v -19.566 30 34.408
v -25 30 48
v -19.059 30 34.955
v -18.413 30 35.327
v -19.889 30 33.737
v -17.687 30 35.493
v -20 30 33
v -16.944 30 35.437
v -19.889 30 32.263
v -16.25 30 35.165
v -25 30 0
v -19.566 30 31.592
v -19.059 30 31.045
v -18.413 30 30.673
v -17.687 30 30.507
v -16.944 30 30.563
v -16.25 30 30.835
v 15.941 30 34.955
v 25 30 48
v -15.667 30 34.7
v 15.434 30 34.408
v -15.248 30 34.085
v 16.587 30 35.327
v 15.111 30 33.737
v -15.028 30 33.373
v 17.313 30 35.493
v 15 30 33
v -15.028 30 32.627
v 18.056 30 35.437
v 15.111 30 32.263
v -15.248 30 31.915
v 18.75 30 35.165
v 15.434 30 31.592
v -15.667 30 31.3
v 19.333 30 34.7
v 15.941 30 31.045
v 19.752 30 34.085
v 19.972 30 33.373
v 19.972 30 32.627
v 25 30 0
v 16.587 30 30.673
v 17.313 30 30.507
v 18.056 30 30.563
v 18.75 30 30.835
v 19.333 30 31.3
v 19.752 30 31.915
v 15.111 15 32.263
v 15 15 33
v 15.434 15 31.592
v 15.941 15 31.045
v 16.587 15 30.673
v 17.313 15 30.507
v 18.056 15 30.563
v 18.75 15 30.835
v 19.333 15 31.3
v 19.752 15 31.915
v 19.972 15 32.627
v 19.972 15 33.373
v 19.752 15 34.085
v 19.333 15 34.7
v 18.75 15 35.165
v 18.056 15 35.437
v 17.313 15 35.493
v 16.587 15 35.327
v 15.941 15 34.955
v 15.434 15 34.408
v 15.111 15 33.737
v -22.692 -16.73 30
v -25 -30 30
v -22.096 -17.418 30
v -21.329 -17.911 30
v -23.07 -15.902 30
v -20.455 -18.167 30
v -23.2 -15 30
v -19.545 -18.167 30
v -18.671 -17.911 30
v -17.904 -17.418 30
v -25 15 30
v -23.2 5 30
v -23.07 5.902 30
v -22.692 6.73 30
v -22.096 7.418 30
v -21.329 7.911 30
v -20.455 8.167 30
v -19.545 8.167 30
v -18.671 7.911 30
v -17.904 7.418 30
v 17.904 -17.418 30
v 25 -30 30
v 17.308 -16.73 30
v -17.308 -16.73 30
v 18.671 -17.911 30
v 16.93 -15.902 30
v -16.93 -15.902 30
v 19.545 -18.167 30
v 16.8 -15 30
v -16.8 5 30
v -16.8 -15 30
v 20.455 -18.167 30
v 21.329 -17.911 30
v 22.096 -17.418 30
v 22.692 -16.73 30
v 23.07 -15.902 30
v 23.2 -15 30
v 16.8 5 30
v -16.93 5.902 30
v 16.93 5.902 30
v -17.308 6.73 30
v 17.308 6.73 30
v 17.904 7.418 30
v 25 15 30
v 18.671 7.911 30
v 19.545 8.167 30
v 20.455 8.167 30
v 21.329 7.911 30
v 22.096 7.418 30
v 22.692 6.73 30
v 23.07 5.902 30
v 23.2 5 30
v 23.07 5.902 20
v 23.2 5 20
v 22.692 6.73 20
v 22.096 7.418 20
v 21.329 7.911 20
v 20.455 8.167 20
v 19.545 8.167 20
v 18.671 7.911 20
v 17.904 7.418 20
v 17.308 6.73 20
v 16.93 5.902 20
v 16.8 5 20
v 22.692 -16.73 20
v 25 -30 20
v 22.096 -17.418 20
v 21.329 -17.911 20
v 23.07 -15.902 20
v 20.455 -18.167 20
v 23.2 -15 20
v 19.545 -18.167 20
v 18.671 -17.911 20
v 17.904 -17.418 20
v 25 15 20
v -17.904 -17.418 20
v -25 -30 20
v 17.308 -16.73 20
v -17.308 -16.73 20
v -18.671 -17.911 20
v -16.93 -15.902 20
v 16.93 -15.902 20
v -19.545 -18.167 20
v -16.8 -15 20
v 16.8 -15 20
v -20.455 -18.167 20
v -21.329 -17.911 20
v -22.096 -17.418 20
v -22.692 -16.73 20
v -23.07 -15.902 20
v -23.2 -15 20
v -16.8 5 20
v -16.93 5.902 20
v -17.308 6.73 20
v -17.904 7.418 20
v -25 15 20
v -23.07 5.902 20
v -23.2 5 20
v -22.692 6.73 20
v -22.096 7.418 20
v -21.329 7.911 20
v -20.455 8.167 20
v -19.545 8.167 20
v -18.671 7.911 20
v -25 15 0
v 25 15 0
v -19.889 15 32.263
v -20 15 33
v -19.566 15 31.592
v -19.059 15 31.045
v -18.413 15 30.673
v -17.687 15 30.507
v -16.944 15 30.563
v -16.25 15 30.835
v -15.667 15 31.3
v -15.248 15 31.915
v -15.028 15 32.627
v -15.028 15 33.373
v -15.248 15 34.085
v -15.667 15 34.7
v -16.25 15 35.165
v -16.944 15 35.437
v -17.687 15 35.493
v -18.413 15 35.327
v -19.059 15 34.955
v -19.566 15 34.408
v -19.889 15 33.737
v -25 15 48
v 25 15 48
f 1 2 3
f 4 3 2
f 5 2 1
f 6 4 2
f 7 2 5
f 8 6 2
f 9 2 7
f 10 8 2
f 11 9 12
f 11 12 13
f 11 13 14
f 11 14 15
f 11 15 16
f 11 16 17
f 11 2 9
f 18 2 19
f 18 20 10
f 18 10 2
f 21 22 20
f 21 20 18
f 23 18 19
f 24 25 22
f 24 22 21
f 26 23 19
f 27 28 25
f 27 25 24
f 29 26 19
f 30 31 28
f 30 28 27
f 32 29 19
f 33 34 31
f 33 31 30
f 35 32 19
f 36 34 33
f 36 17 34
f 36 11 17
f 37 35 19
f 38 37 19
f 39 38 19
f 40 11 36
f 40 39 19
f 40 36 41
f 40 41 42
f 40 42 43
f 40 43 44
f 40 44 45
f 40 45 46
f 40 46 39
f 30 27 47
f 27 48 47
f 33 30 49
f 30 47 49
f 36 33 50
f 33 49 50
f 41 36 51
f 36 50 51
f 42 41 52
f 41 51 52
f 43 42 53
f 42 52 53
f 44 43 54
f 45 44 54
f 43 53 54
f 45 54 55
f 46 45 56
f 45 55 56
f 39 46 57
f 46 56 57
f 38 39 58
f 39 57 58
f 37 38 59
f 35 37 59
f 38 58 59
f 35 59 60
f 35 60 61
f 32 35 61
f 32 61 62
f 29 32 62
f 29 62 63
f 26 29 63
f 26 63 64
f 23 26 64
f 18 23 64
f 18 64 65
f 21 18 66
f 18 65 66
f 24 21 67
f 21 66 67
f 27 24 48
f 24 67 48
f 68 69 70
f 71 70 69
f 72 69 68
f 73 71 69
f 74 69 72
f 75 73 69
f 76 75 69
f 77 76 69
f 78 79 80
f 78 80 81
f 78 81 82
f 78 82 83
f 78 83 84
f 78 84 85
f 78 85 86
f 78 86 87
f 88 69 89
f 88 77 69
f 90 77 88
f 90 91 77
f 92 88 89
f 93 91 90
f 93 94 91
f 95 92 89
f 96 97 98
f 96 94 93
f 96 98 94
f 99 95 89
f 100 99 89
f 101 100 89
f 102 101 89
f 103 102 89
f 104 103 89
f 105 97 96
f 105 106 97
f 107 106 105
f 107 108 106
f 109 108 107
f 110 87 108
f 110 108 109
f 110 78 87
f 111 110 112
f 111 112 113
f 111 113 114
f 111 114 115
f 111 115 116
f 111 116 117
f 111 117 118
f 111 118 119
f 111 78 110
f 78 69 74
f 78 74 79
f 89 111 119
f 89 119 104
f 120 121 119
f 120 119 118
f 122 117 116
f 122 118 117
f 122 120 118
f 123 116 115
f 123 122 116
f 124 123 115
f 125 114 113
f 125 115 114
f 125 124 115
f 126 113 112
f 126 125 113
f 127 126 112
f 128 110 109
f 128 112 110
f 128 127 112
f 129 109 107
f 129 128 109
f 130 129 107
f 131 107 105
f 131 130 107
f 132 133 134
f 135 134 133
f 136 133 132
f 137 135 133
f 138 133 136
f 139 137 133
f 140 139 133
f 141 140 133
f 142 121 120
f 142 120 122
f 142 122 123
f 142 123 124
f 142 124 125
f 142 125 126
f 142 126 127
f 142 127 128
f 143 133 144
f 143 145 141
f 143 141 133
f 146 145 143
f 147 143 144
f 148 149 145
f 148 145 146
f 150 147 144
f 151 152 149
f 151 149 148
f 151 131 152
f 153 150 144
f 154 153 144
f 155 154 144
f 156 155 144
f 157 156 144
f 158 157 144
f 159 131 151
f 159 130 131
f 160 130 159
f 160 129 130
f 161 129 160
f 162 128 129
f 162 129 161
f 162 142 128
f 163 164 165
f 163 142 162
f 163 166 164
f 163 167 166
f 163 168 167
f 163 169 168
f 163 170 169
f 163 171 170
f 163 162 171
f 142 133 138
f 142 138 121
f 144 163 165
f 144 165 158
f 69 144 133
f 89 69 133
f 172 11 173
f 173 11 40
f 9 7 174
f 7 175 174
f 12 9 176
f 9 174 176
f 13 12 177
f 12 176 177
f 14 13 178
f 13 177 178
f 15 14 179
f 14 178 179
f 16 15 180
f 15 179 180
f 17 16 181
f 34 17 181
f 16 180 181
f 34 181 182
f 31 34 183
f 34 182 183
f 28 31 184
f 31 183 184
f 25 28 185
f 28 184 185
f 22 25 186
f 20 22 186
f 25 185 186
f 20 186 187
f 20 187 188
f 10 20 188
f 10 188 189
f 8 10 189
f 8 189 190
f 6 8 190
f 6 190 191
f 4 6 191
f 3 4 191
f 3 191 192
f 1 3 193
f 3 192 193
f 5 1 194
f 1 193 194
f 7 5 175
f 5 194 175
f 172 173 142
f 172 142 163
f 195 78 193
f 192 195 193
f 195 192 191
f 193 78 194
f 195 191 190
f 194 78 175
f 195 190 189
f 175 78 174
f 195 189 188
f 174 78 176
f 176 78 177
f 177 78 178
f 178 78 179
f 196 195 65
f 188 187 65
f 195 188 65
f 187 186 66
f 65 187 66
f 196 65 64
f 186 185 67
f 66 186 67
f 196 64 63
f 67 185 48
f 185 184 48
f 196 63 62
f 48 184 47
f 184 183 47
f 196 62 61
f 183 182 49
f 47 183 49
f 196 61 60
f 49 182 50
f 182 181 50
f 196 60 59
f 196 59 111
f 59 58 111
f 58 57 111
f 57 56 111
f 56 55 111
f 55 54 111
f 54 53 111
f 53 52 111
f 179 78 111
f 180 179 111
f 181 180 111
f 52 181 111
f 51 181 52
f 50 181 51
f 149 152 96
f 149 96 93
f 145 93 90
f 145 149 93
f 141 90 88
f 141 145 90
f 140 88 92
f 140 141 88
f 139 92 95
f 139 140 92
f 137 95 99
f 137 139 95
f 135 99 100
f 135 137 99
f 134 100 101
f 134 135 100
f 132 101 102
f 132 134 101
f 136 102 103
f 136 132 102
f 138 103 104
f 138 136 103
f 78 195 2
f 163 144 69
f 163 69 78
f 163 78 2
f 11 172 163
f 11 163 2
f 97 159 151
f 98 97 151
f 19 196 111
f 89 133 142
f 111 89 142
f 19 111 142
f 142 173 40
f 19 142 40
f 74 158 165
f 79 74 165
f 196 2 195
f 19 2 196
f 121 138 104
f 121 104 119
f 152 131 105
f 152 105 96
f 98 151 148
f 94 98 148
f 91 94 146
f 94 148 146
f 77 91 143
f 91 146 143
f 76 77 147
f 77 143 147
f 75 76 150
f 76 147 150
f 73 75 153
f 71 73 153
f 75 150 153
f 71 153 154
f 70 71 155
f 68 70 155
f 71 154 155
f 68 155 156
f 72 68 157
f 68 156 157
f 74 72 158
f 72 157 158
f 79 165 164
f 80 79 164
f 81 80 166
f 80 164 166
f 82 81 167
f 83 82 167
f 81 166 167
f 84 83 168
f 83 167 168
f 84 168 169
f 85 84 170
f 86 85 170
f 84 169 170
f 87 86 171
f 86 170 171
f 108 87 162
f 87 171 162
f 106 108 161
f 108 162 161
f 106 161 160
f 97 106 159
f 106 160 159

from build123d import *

# Parameters (mm, degrees)
SKETCH_1_W             = 50
SKETCH_1_H             = 60
EXTRUDE_1_DEPTH        = 30
SKETCH_2_W             = 50
SKETCH_2_H             = 45
CUT_EXTRUDE_1_DEPTH    = 20
CUT_EXTRUDE_2_DEPTH    = 11
SKETCH_6_W             = 50
SKETCH_6_H             = 15
EXTRUDE_2_DEPTH        = 18
HOLE_WIZARD_M6_1_D     = 5
HOLE_WIZARD_M6_1_DEPTH = 15
HOLE_WIZARD_M6_1_TIP   = 1.502151548


with BuildPart() as part:
    # 草图1 → 凸台-拉伸1 (new body)
    with BuildSketch(Plane.XY):
        Rectangle(SKETCH_1_W, SKETCH_1_H)
    extrude(amount=EXTRUDE_1_DEPTH)

    # 草图2 → 切除-拉伸1 (cut)
    with BuildSketch(Plane(origin=(0, 0, 0), x_dir=(-1, 0, 0), z_dir=(0, 0, -1))):
        with Locations((0, -7.5)):
            Rectangle(SKETCH_2_W, SKETCH_2_H)
    extrude(amount=-CUT_EXTRUDE_1_DEPTH, mode=Mode.SUBTRACT)

    # 草图3 → 切除-拉伸2 (cut, through all)
    with BuildSketch(Plane(origin=(0, 0, 20), x_dir=(-1, 0, 0), z_dir=(0, 0, -1))):
        with BuildLine():
            Line((-23.2, -15), (-23.2, 5))
            ThreePointArc((-23.2, 5), (-20, 8.2), (-16.8, 5))
            Line((-16.8, 5), (-16.8, -15))
            ThreePointArc((-16.8, -15), (-20, -18.2), (-23.2, -15))
        make_face()
        with BuildLine():
            Line((23.2, -15), (23.2, 5))
            ThreePointArc((23.2, 5), (20, 8.2), (16.8, 5))
            Line((16.8, 5), (16.8, -15))
            ThreePointArc((16.8, -15), (20, -18.2), (23.2, -15))
        make_face()
    extrude(amount=-CUT_EXTRUDE_2_DEPTH, mode=Mode.SUBTRACT)

    # 草图6 → 凸台-拉伸2 (add)
    with BuildSketch(Plane.XY.offset(30)):
        with Locations((0, 22.5)):
            Rectangle(SKETCH_6_W, SKETCH_6_H)
    extrude(amount=EXTRUDE_2_DEPTH)

    # M6 螺纹孔1
    with Locations(Plane(origin=(17.5, 30, 33), x_dir=(1, 0, 0), z_dir=(0, 1, 0))):
        with Locations((0, 0), (-35, 0)):
            Hole(HOLE_WIZARD_M6_1_D / 2, depth=HOLE_WIZARD_M6_1_DEPTH)
            with Locations((0, 0, -(HOLE_WIZARD_M6_1_DEPTH + HOLE_WIZARD_M6_1_TIP / 2))):  # 118° drill point
                Cone(0, HOLE_WIZARD_M6_1_D / 2, HOLE_WIZARD_M6_1_TIP, mode=Mode.SUBTRACT)


solid = part.part
